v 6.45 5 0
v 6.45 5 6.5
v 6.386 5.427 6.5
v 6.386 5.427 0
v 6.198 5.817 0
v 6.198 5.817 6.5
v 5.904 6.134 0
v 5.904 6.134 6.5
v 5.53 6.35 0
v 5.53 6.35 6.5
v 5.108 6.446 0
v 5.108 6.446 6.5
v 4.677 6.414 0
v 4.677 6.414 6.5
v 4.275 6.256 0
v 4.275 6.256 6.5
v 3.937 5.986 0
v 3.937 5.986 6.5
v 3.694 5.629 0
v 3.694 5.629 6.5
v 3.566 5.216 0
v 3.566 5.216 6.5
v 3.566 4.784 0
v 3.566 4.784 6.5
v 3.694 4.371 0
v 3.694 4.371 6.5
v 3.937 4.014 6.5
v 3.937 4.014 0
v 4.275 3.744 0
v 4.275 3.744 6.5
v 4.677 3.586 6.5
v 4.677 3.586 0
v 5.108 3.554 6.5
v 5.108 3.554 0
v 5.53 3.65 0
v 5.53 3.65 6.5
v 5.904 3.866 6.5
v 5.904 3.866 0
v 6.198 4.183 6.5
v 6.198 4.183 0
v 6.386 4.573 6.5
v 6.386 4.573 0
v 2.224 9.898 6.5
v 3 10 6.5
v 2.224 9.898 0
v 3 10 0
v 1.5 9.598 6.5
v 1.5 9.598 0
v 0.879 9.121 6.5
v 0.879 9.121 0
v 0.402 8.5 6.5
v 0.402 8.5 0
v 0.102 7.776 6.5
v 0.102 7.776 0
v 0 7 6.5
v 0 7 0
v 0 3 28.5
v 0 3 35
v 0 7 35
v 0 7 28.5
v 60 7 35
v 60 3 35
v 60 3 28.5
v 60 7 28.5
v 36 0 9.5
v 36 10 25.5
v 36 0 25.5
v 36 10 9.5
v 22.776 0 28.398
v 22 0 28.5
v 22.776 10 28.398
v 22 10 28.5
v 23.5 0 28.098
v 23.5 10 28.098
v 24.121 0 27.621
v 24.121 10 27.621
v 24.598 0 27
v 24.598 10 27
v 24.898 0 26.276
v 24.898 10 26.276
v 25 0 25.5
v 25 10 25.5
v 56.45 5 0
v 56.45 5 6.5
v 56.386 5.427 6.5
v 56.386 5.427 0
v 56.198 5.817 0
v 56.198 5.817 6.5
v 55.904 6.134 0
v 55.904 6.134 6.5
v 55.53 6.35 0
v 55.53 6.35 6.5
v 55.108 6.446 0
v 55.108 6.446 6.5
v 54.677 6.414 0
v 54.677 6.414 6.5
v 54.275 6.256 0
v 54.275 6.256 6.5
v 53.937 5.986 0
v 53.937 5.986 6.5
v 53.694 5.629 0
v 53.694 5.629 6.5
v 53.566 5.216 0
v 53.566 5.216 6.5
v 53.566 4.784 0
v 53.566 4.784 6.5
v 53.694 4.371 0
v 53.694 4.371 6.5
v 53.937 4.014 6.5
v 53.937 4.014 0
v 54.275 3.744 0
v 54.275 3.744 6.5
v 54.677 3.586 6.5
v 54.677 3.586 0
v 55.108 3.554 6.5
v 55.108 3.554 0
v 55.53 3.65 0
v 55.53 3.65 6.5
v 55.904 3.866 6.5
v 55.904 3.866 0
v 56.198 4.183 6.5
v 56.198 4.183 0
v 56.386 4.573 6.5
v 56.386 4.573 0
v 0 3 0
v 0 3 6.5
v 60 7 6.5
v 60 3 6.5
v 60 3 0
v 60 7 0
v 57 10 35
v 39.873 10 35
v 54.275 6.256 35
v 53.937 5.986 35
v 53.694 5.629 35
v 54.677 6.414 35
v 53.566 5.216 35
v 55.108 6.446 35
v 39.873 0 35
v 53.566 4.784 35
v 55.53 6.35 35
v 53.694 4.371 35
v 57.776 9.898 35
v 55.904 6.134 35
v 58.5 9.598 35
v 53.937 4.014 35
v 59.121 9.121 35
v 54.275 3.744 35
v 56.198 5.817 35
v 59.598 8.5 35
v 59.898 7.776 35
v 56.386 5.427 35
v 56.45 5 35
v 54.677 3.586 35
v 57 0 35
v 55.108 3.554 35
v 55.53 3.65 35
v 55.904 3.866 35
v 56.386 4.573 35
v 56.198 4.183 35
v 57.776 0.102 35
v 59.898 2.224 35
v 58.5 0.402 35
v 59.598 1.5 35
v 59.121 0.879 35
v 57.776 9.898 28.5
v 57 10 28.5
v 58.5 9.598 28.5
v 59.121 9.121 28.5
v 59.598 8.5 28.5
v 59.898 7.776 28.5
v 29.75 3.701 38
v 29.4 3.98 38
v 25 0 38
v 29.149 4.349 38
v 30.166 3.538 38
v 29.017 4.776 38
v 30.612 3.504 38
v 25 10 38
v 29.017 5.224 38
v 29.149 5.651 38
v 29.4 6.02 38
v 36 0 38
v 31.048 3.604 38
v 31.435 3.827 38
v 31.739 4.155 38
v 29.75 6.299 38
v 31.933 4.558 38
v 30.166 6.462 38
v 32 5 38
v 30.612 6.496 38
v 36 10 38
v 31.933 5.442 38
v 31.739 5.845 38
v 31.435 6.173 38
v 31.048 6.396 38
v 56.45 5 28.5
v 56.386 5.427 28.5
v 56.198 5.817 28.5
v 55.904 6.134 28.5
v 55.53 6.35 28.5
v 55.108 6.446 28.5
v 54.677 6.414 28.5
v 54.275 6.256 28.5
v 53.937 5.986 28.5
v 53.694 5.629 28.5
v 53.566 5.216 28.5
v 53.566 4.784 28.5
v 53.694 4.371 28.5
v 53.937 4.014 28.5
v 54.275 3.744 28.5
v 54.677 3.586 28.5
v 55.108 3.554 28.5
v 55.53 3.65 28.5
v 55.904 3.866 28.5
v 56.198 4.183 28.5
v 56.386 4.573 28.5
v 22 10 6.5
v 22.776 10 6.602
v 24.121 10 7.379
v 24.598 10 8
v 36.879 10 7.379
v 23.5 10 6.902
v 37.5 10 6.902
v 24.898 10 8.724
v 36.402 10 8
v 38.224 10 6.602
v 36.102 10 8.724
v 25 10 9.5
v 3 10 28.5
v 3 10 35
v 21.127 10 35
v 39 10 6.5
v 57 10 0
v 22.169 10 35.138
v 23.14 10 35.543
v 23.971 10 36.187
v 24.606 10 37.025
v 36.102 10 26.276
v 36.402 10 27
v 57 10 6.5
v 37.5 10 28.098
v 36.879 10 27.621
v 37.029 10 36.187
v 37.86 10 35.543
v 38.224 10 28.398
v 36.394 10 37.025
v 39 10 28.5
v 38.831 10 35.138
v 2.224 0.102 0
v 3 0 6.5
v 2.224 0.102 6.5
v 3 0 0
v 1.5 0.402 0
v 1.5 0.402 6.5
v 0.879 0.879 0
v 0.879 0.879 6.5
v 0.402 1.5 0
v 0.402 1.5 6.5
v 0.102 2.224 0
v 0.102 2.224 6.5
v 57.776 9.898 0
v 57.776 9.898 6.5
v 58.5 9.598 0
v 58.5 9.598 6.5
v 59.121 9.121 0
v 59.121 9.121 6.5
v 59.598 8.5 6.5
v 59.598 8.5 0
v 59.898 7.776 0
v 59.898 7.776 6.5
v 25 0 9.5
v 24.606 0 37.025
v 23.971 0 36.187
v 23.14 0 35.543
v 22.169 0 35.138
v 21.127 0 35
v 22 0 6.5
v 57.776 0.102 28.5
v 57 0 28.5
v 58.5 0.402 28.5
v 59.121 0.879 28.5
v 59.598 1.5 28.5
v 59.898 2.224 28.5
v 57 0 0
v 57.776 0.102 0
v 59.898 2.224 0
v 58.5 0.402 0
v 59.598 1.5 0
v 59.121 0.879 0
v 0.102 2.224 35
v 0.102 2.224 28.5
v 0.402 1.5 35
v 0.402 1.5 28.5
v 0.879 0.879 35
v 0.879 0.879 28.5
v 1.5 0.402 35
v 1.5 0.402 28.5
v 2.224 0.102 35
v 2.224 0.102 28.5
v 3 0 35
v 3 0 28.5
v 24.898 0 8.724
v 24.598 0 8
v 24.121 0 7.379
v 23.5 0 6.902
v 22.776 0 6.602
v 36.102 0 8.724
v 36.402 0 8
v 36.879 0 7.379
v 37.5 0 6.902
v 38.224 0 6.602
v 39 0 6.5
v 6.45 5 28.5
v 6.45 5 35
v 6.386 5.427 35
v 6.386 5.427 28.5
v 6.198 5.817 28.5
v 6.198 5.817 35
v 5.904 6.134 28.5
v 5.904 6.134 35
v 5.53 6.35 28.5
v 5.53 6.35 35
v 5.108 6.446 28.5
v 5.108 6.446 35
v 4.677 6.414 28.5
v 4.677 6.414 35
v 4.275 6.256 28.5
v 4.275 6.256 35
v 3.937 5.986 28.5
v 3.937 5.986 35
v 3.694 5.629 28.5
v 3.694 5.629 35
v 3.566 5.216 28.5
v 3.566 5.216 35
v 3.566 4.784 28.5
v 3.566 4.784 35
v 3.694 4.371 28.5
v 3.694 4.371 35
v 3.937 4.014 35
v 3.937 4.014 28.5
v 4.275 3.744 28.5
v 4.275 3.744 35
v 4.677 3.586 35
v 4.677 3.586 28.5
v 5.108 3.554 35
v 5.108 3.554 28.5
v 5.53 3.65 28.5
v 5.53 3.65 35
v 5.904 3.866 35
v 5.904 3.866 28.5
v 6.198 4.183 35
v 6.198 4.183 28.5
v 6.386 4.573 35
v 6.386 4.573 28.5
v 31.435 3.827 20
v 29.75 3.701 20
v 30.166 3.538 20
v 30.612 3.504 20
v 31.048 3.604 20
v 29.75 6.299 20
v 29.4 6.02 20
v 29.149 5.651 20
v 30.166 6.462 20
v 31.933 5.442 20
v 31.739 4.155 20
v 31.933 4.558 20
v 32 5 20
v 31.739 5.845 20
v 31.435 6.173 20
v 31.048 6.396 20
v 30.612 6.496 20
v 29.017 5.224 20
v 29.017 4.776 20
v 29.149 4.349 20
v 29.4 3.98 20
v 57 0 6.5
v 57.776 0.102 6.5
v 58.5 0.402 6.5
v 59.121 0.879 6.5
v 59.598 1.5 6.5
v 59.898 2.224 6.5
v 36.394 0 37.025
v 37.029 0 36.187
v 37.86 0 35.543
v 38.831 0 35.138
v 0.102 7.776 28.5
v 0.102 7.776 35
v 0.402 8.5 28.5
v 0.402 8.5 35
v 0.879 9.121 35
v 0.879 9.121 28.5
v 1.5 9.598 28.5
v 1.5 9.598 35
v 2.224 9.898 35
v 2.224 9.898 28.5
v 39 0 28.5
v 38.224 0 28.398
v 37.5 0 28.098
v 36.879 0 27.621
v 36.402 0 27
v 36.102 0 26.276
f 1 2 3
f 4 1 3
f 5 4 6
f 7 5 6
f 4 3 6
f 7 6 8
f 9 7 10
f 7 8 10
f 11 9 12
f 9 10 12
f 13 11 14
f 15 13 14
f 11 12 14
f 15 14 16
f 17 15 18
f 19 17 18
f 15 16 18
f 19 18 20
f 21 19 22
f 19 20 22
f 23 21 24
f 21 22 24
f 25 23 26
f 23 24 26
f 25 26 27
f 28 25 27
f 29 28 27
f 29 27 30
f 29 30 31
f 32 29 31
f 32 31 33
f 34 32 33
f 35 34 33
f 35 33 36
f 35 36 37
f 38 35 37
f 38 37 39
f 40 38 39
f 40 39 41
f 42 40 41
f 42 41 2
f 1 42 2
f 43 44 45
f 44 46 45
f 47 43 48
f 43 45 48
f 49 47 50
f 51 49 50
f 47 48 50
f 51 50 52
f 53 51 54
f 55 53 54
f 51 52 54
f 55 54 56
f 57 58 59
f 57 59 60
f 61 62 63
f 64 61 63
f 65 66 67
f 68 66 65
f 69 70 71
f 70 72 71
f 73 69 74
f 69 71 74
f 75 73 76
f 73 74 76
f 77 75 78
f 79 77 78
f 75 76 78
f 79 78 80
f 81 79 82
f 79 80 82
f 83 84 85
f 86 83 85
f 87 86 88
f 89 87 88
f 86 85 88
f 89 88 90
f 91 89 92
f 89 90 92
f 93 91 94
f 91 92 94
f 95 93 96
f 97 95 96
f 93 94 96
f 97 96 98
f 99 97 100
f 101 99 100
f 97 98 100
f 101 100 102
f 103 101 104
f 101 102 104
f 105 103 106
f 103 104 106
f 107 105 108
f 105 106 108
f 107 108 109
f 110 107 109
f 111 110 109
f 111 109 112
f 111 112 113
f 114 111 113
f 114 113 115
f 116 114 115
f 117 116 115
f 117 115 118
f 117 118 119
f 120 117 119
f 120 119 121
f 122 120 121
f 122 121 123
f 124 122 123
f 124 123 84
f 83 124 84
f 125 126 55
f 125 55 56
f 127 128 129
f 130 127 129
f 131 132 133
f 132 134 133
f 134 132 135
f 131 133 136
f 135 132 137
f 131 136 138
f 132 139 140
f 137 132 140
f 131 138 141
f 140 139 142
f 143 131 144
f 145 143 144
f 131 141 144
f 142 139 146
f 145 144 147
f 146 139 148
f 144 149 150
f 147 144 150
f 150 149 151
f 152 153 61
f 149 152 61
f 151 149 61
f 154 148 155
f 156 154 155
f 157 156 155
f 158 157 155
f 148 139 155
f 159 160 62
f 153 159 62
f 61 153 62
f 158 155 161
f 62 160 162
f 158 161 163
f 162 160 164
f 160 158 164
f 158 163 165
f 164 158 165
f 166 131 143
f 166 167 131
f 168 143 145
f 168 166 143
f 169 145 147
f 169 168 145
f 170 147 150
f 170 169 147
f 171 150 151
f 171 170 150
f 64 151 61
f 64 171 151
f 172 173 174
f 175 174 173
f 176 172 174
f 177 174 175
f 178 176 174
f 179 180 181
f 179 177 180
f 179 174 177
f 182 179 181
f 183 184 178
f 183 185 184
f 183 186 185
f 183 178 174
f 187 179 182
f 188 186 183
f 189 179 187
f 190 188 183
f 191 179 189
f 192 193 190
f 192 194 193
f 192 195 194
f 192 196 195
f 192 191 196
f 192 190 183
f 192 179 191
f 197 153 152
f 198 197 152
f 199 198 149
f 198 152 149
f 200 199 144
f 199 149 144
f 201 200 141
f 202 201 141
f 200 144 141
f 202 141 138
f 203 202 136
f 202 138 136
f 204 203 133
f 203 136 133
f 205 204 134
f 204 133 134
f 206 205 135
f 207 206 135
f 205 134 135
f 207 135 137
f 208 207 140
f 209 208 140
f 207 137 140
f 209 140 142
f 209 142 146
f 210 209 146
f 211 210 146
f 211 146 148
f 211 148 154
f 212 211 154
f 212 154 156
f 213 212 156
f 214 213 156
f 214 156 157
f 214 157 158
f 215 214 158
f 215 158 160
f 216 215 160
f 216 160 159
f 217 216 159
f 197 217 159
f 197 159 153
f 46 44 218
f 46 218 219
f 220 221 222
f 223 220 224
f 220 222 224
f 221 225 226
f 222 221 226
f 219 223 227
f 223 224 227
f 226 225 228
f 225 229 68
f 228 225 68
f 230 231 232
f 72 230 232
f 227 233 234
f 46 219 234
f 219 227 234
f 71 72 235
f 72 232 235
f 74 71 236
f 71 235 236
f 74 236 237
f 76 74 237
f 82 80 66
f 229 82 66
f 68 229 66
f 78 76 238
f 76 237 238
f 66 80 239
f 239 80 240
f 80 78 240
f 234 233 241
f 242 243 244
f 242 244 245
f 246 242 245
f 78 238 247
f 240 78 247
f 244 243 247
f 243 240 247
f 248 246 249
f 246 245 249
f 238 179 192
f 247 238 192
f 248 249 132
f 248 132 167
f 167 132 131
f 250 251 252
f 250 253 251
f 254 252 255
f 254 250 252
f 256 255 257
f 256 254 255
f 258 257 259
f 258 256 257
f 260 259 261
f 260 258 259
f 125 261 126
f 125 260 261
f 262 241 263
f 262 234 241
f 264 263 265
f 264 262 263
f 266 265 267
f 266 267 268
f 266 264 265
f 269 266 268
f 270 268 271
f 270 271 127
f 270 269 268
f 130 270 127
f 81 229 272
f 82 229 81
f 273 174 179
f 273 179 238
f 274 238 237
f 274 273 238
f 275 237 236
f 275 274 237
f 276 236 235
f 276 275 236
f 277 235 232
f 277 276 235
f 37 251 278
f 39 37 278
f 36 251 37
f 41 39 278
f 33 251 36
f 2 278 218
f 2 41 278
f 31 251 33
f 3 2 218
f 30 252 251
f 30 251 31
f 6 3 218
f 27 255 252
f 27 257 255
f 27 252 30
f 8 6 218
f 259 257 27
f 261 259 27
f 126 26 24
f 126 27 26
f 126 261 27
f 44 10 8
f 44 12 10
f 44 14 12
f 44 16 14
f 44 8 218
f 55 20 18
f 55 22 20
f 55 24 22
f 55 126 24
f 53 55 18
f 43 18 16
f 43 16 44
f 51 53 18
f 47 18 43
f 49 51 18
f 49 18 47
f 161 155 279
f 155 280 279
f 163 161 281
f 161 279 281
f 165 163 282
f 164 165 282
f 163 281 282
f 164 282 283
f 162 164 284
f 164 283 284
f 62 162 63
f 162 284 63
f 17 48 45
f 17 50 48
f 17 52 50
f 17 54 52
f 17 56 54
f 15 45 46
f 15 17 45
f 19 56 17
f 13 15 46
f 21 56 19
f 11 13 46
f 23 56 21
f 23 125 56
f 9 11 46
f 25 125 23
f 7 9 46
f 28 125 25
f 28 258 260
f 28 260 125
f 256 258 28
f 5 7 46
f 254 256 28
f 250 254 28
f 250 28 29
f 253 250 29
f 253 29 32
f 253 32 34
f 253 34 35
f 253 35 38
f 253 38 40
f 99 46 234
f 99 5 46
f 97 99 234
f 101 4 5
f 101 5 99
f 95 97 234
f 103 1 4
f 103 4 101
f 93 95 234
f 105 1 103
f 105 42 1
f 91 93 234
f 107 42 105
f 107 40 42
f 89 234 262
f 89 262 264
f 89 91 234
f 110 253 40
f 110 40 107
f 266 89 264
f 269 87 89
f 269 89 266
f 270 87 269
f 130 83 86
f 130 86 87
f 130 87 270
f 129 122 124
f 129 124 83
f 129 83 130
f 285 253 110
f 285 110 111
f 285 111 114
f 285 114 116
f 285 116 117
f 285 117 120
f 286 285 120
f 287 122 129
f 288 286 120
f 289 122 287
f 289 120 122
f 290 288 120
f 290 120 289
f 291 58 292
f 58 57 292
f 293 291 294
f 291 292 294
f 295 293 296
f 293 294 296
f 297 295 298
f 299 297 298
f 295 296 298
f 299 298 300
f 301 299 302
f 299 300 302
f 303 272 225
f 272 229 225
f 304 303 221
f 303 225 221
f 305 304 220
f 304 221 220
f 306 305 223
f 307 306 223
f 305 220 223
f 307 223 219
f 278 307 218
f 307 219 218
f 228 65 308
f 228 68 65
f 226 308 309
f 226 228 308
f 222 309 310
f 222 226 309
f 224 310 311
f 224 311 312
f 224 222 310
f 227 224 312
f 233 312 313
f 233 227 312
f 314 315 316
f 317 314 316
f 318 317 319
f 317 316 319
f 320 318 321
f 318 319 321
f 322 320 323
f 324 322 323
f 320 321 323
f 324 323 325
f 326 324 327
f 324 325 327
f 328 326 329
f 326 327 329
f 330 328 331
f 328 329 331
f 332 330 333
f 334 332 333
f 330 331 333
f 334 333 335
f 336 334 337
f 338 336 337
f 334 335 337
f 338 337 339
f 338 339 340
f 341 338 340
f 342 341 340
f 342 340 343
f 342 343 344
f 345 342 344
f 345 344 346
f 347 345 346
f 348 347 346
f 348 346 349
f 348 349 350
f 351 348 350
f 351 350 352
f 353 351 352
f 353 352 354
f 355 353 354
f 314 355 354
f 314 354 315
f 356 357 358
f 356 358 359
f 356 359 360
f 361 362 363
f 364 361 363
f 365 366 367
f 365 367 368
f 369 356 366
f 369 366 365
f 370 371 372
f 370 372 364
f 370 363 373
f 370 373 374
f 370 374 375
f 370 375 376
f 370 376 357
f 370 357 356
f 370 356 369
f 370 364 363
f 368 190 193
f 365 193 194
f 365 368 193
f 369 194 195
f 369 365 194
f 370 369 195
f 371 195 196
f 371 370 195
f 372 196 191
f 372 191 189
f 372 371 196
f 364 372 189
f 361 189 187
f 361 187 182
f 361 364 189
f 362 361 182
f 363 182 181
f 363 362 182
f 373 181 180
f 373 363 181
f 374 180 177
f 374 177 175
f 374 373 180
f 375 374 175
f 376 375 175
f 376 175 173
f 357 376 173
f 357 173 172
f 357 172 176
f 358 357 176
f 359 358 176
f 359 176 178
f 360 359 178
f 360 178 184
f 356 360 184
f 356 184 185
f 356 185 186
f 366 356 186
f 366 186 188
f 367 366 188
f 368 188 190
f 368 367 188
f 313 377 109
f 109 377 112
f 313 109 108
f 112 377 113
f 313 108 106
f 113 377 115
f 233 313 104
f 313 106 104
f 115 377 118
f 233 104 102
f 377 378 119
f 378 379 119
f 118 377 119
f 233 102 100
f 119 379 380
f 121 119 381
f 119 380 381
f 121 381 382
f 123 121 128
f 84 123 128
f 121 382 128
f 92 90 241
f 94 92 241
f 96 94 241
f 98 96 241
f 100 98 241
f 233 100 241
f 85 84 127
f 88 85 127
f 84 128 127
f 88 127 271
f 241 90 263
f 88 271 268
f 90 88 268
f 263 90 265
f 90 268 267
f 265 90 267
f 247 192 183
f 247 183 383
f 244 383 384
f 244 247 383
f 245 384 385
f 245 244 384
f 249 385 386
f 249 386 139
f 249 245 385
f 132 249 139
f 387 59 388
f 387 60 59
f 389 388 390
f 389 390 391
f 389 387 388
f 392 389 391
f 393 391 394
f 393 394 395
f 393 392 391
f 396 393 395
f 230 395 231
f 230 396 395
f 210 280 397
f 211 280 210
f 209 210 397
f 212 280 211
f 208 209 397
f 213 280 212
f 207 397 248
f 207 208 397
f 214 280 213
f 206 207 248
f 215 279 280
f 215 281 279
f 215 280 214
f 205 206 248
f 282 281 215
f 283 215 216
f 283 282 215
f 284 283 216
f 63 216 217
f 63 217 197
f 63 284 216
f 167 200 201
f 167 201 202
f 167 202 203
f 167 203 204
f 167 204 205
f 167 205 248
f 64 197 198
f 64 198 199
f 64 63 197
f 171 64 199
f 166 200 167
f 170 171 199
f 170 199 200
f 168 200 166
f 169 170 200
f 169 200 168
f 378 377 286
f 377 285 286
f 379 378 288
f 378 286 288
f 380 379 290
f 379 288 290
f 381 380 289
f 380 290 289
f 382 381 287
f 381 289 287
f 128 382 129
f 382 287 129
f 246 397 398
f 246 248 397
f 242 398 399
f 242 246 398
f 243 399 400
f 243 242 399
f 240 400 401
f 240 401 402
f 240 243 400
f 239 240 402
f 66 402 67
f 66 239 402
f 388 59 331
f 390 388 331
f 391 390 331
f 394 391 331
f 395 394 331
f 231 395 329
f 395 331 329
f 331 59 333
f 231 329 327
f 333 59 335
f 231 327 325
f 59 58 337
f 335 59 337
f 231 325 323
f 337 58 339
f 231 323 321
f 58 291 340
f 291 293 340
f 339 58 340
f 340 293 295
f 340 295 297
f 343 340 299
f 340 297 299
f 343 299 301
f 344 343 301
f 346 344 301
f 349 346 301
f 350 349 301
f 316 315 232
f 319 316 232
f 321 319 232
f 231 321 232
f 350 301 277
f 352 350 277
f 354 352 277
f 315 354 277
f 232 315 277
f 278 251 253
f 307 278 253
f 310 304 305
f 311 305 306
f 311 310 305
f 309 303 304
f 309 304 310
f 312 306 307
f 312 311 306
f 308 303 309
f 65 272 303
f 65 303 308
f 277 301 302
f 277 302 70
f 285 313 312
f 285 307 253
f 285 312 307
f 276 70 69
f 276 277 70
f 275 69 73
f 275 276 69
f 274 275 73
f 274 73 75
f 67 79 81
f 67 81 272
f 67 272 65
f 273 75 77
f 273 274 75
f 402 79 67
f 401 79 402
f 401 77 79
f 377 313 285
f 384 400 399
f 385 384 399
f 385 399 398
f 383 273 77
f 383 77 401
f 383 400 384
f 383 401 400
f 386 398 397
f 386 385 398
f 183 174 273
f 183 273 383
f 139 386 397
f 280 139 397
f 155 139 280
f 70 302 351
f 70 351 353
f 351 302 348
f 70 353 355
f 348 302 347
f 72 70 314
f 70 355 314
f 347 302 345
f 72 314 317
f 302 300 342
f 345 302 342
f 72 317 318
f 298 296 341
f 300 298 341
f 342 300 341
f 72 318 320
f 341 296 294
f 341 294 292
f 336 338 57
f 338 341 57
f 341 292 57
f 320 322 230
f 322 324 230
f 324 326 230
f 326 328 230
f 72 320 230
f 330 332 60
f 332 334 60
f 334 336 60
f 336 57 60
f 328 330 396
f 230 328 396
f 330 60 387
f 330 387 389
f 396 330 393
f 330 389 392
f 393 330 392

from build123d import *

# Parameters (mm, degrees)
SKETCH1_W               = 60
SKETCH1_H               = 35
BOSS_EXTRUDE1_DEPTH     = 10
SKETCH2_W               = 22
SKETCH2_H               = 10
CUT_EXTRUDE1_DEPTH      = 24
SKETCH3_W               = 22
SKETCH3_H               = 10
CUT_EXTRUDE2_DEPTH      = 25
SKETCH5_R               = 1.45
CUT_EXTRUDE4_DEPTH      = 71.178344238
FILLET1_R               = 3
FILLET2_R               = 3
SKETCH7_W               = 11
SKETCH7_H               = 10
BOSS_EXTRUDE2_DEPTH     = 3
CUT_EXTRUDE5_DEPTH      = 3
CUT_EXTRUDE5_DEPTH_BACK = 15
SKETCH6_R               = 1.5
FILLET3_R               = 4


with BuildPart() as part:
    # Sketch1 → Boss-Extrude1 (new body)
    with BuildSketch(Plane(origin=(0, 0, 0), x_dir=(1, 0, 0), z_dir=(0, 1, 0))):
        with Locations((30, -17.5)):
            Rectangle(SKETCH1_W, SKETCH1_H)
    extrude(amount=BOSS_EXTRUDE1_DEPTH)

    # Sketch2 → Cut-Extrude1 (cut)
    with BuildSketch(Plane(origin=(60, 0, 0), x_dir=(0, 0, -1), z_dir=(1, 0, 0))):
        with Locations((-17.5, 5)):
            Rectangle(SKETCH2_W, SKETCH2_H)
    extrude(amount=-CUT_EXTRUDE1_DEPTH, mode=Mode.SUBTRACT)

    # Sketch3 → Cut-Extrude2 (cut)
    with BuildSketch(Plane.ZY):
        with Locations((17.5, 5)):
            Rectangle(SKETCH3_W, SKETCH3_H)
    extrude(amount=-CUT_EXTRUDE2_DEPTH, mode=Mode.SUBTRACT)

    # Sketch5 → Cut-Extrude4 (cut, through all)
    with BuildSketch(Plane.XY.offset(35)):
        with Locations((5, 5)):
            Circle(SKETCH5_R)
        with Locations((55, 5)):
            Circle(SKETCH5_R)
    extrude(amount=-CUT_EXTRUDE4_DEPTH, mode=Mode.SUBTRACT)

    # Fillet1
    fillet1_edges = [part.edges().sort_by_distance(p)[0] for p in [
        (60, 10, 31.75),
        (60, 0, 3.25),
        (60, 10, 3.25),
        (0, 0, 31.75),
        (0, 10, 31.75),
        (0, 10, 3.25),
        (60, 0, 31.75),
        (0, 0, 3.25),
    ]]
    fillet(fillet1_edges, radius=FILLET1_R)

    # Fillet2
    fillet2_edges = [part.edges().sort_by_distance(p)[0] for p in [
        (36, 5, 28.5),
        (36, 5, 6.5),
        (25, 5, 6.5),
        (25, 5, 28.5),
    ]]
    fillet(fillet2_edges, radius=FILLET2_R)

    # Sketch7 → Boss-Extrude2 (add)
    with BuildSketch(Plane.XY.offset(35)):
        with Locations((30.5, 5)):
            Rectangle(SKETCH7_W, SKETCH7_H)
    extrude(amount=BOSS_EXTRUDE2_DEPTH)

    # Sketch6 → Cut-Extrude5 (cut, two sides: drawn at the far end of the back side and taken through both)
    with BuildSketch(Plane.XY.offset(35).offset(-CUT_EXTRUDE5_DEPTH_BACK)):
        with Locations((30.5, 5)):
            Circle(SKETCH6_R)
    extrude(amount=CUT_EXTRUDE5_DEPTH + CUT_EXTRUDE5_DEPTH_BACK, mode=Mode.SUBTRACT)

    # Fillet3
    # the kernel refuses this fillet: 4 mm, written as the material it adds along each edge
    with BuildSketch(Plane(origin=(36, 10, 35), x_dir=(0, 0, 1), z_dir=(0, -1, 0))) as fillet3_piece_1:
        with BuildLine():
            CenterArc((4, -3.872983346), FILLET3_R, 104.477512186, 75.522487814)
            Line((0, -3.872983346), (-0.08, -3.872983346))
            Line((-0.08, -3.872983346), (-0.08, 0))
            Line((-0.08, 0), (0, 0.08))
            ThreePointArc((0, 0.08), (1.5, 0.08), (2.98, 0.077459667))
            Line((2.98, 0.077459667), (3, 0))
        make_face()
    extrude(amount=10)
    with BuildSketch(Plane(origin=(25, 0, 35), x_dir=(-1, 0, 0), z_dir=(0, 1, 0))) as fillet3_piece_2:
        with BuildLine():
            CenterArc((3.872983346, 4), FILLET3_R, 194.477512186, 75.522487814)
            Line((0, 3), (-0.077459667, 2.98))
            ThreePointArc((-0.077459667, 2.98), (-0.08, 1.5), (-0.08, 0))
            Line((-0.08, 0), (0, -0.08))
            Line((0, -0.08), (3.872983346, -0.08))
            Line((3.872983346, -0.08), (3.872983346, 0))
        make_face()
    extrude(amount=10)


solid = part.part
